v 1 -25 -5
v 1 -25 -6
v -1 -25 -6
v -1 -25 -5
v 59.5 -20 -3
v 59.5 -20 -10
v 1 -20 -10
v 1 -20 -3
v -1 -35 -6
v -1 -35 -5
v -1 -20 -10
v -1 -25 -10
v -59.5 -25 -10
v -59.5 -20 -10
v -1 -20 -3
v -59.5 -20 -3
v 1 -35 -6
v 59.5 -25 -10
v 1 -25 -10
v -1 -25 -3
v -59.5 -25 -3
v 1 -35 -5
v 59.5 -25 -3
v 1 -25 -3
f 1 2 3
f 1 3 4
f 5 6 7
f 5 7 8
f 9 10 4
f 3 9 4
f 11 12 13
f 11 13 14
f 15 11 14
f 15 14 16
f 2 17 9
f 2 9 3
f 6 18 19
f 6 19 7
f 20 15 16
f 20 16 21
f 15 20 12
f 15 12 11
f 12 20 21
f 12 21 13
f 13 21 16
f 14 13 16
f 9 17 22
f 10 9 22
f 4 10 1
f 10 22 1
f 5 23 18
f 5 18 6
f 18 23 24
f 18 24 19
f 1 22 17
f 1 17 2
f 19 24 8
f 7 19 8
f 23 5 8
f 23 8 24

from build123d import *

# Parameters (mm, degrees)
F1_DEPTH = 59.5
F0_W     = 10
F0_H     = 1
F2_DEPTH = 1
F3_W     = 25.6279632449
F3_H     = 26.6232225113
F4_DEPTH = 1


# Not quite as in the source:
# - a feature of the source that left no trace in its solid (it failed there, or was rolled back) is left out


with BuildPart() as f1:
    # F0 (on Right) → F1 (new body, symmetric)
    with BuildSketch(Plane.YZ):
        Polygon((-20, -3), (-25, -3), (-25, -5), (-25, -6), (-25, -10), (-20, -10), align=None)
    extrude(amount=F1_DEPTH, both=True)

    # F3 (on Right) → F4 (cut, symmetric)
    with BuildSketch(Plane.YZ):
        with Locations((-24.7571095824, -6.4691940788)):
            Rectangle(F3_W, F3_H)
    extrude(amount=F4_DEPTH, both=True, mode=Mode.SUBTRACT)


with BuildPart() as f2:
    # F0 (on Right) → F2 (new body, symmetric)
    with BuildSketch(Plane.YZ):
        with Locations((-30, -5.5)):
            Rectangle(F0_W, F0_H)
    extrude(amount=F2_DEPTH, both=True)


solid = Compound([f1.part, f2.part])
